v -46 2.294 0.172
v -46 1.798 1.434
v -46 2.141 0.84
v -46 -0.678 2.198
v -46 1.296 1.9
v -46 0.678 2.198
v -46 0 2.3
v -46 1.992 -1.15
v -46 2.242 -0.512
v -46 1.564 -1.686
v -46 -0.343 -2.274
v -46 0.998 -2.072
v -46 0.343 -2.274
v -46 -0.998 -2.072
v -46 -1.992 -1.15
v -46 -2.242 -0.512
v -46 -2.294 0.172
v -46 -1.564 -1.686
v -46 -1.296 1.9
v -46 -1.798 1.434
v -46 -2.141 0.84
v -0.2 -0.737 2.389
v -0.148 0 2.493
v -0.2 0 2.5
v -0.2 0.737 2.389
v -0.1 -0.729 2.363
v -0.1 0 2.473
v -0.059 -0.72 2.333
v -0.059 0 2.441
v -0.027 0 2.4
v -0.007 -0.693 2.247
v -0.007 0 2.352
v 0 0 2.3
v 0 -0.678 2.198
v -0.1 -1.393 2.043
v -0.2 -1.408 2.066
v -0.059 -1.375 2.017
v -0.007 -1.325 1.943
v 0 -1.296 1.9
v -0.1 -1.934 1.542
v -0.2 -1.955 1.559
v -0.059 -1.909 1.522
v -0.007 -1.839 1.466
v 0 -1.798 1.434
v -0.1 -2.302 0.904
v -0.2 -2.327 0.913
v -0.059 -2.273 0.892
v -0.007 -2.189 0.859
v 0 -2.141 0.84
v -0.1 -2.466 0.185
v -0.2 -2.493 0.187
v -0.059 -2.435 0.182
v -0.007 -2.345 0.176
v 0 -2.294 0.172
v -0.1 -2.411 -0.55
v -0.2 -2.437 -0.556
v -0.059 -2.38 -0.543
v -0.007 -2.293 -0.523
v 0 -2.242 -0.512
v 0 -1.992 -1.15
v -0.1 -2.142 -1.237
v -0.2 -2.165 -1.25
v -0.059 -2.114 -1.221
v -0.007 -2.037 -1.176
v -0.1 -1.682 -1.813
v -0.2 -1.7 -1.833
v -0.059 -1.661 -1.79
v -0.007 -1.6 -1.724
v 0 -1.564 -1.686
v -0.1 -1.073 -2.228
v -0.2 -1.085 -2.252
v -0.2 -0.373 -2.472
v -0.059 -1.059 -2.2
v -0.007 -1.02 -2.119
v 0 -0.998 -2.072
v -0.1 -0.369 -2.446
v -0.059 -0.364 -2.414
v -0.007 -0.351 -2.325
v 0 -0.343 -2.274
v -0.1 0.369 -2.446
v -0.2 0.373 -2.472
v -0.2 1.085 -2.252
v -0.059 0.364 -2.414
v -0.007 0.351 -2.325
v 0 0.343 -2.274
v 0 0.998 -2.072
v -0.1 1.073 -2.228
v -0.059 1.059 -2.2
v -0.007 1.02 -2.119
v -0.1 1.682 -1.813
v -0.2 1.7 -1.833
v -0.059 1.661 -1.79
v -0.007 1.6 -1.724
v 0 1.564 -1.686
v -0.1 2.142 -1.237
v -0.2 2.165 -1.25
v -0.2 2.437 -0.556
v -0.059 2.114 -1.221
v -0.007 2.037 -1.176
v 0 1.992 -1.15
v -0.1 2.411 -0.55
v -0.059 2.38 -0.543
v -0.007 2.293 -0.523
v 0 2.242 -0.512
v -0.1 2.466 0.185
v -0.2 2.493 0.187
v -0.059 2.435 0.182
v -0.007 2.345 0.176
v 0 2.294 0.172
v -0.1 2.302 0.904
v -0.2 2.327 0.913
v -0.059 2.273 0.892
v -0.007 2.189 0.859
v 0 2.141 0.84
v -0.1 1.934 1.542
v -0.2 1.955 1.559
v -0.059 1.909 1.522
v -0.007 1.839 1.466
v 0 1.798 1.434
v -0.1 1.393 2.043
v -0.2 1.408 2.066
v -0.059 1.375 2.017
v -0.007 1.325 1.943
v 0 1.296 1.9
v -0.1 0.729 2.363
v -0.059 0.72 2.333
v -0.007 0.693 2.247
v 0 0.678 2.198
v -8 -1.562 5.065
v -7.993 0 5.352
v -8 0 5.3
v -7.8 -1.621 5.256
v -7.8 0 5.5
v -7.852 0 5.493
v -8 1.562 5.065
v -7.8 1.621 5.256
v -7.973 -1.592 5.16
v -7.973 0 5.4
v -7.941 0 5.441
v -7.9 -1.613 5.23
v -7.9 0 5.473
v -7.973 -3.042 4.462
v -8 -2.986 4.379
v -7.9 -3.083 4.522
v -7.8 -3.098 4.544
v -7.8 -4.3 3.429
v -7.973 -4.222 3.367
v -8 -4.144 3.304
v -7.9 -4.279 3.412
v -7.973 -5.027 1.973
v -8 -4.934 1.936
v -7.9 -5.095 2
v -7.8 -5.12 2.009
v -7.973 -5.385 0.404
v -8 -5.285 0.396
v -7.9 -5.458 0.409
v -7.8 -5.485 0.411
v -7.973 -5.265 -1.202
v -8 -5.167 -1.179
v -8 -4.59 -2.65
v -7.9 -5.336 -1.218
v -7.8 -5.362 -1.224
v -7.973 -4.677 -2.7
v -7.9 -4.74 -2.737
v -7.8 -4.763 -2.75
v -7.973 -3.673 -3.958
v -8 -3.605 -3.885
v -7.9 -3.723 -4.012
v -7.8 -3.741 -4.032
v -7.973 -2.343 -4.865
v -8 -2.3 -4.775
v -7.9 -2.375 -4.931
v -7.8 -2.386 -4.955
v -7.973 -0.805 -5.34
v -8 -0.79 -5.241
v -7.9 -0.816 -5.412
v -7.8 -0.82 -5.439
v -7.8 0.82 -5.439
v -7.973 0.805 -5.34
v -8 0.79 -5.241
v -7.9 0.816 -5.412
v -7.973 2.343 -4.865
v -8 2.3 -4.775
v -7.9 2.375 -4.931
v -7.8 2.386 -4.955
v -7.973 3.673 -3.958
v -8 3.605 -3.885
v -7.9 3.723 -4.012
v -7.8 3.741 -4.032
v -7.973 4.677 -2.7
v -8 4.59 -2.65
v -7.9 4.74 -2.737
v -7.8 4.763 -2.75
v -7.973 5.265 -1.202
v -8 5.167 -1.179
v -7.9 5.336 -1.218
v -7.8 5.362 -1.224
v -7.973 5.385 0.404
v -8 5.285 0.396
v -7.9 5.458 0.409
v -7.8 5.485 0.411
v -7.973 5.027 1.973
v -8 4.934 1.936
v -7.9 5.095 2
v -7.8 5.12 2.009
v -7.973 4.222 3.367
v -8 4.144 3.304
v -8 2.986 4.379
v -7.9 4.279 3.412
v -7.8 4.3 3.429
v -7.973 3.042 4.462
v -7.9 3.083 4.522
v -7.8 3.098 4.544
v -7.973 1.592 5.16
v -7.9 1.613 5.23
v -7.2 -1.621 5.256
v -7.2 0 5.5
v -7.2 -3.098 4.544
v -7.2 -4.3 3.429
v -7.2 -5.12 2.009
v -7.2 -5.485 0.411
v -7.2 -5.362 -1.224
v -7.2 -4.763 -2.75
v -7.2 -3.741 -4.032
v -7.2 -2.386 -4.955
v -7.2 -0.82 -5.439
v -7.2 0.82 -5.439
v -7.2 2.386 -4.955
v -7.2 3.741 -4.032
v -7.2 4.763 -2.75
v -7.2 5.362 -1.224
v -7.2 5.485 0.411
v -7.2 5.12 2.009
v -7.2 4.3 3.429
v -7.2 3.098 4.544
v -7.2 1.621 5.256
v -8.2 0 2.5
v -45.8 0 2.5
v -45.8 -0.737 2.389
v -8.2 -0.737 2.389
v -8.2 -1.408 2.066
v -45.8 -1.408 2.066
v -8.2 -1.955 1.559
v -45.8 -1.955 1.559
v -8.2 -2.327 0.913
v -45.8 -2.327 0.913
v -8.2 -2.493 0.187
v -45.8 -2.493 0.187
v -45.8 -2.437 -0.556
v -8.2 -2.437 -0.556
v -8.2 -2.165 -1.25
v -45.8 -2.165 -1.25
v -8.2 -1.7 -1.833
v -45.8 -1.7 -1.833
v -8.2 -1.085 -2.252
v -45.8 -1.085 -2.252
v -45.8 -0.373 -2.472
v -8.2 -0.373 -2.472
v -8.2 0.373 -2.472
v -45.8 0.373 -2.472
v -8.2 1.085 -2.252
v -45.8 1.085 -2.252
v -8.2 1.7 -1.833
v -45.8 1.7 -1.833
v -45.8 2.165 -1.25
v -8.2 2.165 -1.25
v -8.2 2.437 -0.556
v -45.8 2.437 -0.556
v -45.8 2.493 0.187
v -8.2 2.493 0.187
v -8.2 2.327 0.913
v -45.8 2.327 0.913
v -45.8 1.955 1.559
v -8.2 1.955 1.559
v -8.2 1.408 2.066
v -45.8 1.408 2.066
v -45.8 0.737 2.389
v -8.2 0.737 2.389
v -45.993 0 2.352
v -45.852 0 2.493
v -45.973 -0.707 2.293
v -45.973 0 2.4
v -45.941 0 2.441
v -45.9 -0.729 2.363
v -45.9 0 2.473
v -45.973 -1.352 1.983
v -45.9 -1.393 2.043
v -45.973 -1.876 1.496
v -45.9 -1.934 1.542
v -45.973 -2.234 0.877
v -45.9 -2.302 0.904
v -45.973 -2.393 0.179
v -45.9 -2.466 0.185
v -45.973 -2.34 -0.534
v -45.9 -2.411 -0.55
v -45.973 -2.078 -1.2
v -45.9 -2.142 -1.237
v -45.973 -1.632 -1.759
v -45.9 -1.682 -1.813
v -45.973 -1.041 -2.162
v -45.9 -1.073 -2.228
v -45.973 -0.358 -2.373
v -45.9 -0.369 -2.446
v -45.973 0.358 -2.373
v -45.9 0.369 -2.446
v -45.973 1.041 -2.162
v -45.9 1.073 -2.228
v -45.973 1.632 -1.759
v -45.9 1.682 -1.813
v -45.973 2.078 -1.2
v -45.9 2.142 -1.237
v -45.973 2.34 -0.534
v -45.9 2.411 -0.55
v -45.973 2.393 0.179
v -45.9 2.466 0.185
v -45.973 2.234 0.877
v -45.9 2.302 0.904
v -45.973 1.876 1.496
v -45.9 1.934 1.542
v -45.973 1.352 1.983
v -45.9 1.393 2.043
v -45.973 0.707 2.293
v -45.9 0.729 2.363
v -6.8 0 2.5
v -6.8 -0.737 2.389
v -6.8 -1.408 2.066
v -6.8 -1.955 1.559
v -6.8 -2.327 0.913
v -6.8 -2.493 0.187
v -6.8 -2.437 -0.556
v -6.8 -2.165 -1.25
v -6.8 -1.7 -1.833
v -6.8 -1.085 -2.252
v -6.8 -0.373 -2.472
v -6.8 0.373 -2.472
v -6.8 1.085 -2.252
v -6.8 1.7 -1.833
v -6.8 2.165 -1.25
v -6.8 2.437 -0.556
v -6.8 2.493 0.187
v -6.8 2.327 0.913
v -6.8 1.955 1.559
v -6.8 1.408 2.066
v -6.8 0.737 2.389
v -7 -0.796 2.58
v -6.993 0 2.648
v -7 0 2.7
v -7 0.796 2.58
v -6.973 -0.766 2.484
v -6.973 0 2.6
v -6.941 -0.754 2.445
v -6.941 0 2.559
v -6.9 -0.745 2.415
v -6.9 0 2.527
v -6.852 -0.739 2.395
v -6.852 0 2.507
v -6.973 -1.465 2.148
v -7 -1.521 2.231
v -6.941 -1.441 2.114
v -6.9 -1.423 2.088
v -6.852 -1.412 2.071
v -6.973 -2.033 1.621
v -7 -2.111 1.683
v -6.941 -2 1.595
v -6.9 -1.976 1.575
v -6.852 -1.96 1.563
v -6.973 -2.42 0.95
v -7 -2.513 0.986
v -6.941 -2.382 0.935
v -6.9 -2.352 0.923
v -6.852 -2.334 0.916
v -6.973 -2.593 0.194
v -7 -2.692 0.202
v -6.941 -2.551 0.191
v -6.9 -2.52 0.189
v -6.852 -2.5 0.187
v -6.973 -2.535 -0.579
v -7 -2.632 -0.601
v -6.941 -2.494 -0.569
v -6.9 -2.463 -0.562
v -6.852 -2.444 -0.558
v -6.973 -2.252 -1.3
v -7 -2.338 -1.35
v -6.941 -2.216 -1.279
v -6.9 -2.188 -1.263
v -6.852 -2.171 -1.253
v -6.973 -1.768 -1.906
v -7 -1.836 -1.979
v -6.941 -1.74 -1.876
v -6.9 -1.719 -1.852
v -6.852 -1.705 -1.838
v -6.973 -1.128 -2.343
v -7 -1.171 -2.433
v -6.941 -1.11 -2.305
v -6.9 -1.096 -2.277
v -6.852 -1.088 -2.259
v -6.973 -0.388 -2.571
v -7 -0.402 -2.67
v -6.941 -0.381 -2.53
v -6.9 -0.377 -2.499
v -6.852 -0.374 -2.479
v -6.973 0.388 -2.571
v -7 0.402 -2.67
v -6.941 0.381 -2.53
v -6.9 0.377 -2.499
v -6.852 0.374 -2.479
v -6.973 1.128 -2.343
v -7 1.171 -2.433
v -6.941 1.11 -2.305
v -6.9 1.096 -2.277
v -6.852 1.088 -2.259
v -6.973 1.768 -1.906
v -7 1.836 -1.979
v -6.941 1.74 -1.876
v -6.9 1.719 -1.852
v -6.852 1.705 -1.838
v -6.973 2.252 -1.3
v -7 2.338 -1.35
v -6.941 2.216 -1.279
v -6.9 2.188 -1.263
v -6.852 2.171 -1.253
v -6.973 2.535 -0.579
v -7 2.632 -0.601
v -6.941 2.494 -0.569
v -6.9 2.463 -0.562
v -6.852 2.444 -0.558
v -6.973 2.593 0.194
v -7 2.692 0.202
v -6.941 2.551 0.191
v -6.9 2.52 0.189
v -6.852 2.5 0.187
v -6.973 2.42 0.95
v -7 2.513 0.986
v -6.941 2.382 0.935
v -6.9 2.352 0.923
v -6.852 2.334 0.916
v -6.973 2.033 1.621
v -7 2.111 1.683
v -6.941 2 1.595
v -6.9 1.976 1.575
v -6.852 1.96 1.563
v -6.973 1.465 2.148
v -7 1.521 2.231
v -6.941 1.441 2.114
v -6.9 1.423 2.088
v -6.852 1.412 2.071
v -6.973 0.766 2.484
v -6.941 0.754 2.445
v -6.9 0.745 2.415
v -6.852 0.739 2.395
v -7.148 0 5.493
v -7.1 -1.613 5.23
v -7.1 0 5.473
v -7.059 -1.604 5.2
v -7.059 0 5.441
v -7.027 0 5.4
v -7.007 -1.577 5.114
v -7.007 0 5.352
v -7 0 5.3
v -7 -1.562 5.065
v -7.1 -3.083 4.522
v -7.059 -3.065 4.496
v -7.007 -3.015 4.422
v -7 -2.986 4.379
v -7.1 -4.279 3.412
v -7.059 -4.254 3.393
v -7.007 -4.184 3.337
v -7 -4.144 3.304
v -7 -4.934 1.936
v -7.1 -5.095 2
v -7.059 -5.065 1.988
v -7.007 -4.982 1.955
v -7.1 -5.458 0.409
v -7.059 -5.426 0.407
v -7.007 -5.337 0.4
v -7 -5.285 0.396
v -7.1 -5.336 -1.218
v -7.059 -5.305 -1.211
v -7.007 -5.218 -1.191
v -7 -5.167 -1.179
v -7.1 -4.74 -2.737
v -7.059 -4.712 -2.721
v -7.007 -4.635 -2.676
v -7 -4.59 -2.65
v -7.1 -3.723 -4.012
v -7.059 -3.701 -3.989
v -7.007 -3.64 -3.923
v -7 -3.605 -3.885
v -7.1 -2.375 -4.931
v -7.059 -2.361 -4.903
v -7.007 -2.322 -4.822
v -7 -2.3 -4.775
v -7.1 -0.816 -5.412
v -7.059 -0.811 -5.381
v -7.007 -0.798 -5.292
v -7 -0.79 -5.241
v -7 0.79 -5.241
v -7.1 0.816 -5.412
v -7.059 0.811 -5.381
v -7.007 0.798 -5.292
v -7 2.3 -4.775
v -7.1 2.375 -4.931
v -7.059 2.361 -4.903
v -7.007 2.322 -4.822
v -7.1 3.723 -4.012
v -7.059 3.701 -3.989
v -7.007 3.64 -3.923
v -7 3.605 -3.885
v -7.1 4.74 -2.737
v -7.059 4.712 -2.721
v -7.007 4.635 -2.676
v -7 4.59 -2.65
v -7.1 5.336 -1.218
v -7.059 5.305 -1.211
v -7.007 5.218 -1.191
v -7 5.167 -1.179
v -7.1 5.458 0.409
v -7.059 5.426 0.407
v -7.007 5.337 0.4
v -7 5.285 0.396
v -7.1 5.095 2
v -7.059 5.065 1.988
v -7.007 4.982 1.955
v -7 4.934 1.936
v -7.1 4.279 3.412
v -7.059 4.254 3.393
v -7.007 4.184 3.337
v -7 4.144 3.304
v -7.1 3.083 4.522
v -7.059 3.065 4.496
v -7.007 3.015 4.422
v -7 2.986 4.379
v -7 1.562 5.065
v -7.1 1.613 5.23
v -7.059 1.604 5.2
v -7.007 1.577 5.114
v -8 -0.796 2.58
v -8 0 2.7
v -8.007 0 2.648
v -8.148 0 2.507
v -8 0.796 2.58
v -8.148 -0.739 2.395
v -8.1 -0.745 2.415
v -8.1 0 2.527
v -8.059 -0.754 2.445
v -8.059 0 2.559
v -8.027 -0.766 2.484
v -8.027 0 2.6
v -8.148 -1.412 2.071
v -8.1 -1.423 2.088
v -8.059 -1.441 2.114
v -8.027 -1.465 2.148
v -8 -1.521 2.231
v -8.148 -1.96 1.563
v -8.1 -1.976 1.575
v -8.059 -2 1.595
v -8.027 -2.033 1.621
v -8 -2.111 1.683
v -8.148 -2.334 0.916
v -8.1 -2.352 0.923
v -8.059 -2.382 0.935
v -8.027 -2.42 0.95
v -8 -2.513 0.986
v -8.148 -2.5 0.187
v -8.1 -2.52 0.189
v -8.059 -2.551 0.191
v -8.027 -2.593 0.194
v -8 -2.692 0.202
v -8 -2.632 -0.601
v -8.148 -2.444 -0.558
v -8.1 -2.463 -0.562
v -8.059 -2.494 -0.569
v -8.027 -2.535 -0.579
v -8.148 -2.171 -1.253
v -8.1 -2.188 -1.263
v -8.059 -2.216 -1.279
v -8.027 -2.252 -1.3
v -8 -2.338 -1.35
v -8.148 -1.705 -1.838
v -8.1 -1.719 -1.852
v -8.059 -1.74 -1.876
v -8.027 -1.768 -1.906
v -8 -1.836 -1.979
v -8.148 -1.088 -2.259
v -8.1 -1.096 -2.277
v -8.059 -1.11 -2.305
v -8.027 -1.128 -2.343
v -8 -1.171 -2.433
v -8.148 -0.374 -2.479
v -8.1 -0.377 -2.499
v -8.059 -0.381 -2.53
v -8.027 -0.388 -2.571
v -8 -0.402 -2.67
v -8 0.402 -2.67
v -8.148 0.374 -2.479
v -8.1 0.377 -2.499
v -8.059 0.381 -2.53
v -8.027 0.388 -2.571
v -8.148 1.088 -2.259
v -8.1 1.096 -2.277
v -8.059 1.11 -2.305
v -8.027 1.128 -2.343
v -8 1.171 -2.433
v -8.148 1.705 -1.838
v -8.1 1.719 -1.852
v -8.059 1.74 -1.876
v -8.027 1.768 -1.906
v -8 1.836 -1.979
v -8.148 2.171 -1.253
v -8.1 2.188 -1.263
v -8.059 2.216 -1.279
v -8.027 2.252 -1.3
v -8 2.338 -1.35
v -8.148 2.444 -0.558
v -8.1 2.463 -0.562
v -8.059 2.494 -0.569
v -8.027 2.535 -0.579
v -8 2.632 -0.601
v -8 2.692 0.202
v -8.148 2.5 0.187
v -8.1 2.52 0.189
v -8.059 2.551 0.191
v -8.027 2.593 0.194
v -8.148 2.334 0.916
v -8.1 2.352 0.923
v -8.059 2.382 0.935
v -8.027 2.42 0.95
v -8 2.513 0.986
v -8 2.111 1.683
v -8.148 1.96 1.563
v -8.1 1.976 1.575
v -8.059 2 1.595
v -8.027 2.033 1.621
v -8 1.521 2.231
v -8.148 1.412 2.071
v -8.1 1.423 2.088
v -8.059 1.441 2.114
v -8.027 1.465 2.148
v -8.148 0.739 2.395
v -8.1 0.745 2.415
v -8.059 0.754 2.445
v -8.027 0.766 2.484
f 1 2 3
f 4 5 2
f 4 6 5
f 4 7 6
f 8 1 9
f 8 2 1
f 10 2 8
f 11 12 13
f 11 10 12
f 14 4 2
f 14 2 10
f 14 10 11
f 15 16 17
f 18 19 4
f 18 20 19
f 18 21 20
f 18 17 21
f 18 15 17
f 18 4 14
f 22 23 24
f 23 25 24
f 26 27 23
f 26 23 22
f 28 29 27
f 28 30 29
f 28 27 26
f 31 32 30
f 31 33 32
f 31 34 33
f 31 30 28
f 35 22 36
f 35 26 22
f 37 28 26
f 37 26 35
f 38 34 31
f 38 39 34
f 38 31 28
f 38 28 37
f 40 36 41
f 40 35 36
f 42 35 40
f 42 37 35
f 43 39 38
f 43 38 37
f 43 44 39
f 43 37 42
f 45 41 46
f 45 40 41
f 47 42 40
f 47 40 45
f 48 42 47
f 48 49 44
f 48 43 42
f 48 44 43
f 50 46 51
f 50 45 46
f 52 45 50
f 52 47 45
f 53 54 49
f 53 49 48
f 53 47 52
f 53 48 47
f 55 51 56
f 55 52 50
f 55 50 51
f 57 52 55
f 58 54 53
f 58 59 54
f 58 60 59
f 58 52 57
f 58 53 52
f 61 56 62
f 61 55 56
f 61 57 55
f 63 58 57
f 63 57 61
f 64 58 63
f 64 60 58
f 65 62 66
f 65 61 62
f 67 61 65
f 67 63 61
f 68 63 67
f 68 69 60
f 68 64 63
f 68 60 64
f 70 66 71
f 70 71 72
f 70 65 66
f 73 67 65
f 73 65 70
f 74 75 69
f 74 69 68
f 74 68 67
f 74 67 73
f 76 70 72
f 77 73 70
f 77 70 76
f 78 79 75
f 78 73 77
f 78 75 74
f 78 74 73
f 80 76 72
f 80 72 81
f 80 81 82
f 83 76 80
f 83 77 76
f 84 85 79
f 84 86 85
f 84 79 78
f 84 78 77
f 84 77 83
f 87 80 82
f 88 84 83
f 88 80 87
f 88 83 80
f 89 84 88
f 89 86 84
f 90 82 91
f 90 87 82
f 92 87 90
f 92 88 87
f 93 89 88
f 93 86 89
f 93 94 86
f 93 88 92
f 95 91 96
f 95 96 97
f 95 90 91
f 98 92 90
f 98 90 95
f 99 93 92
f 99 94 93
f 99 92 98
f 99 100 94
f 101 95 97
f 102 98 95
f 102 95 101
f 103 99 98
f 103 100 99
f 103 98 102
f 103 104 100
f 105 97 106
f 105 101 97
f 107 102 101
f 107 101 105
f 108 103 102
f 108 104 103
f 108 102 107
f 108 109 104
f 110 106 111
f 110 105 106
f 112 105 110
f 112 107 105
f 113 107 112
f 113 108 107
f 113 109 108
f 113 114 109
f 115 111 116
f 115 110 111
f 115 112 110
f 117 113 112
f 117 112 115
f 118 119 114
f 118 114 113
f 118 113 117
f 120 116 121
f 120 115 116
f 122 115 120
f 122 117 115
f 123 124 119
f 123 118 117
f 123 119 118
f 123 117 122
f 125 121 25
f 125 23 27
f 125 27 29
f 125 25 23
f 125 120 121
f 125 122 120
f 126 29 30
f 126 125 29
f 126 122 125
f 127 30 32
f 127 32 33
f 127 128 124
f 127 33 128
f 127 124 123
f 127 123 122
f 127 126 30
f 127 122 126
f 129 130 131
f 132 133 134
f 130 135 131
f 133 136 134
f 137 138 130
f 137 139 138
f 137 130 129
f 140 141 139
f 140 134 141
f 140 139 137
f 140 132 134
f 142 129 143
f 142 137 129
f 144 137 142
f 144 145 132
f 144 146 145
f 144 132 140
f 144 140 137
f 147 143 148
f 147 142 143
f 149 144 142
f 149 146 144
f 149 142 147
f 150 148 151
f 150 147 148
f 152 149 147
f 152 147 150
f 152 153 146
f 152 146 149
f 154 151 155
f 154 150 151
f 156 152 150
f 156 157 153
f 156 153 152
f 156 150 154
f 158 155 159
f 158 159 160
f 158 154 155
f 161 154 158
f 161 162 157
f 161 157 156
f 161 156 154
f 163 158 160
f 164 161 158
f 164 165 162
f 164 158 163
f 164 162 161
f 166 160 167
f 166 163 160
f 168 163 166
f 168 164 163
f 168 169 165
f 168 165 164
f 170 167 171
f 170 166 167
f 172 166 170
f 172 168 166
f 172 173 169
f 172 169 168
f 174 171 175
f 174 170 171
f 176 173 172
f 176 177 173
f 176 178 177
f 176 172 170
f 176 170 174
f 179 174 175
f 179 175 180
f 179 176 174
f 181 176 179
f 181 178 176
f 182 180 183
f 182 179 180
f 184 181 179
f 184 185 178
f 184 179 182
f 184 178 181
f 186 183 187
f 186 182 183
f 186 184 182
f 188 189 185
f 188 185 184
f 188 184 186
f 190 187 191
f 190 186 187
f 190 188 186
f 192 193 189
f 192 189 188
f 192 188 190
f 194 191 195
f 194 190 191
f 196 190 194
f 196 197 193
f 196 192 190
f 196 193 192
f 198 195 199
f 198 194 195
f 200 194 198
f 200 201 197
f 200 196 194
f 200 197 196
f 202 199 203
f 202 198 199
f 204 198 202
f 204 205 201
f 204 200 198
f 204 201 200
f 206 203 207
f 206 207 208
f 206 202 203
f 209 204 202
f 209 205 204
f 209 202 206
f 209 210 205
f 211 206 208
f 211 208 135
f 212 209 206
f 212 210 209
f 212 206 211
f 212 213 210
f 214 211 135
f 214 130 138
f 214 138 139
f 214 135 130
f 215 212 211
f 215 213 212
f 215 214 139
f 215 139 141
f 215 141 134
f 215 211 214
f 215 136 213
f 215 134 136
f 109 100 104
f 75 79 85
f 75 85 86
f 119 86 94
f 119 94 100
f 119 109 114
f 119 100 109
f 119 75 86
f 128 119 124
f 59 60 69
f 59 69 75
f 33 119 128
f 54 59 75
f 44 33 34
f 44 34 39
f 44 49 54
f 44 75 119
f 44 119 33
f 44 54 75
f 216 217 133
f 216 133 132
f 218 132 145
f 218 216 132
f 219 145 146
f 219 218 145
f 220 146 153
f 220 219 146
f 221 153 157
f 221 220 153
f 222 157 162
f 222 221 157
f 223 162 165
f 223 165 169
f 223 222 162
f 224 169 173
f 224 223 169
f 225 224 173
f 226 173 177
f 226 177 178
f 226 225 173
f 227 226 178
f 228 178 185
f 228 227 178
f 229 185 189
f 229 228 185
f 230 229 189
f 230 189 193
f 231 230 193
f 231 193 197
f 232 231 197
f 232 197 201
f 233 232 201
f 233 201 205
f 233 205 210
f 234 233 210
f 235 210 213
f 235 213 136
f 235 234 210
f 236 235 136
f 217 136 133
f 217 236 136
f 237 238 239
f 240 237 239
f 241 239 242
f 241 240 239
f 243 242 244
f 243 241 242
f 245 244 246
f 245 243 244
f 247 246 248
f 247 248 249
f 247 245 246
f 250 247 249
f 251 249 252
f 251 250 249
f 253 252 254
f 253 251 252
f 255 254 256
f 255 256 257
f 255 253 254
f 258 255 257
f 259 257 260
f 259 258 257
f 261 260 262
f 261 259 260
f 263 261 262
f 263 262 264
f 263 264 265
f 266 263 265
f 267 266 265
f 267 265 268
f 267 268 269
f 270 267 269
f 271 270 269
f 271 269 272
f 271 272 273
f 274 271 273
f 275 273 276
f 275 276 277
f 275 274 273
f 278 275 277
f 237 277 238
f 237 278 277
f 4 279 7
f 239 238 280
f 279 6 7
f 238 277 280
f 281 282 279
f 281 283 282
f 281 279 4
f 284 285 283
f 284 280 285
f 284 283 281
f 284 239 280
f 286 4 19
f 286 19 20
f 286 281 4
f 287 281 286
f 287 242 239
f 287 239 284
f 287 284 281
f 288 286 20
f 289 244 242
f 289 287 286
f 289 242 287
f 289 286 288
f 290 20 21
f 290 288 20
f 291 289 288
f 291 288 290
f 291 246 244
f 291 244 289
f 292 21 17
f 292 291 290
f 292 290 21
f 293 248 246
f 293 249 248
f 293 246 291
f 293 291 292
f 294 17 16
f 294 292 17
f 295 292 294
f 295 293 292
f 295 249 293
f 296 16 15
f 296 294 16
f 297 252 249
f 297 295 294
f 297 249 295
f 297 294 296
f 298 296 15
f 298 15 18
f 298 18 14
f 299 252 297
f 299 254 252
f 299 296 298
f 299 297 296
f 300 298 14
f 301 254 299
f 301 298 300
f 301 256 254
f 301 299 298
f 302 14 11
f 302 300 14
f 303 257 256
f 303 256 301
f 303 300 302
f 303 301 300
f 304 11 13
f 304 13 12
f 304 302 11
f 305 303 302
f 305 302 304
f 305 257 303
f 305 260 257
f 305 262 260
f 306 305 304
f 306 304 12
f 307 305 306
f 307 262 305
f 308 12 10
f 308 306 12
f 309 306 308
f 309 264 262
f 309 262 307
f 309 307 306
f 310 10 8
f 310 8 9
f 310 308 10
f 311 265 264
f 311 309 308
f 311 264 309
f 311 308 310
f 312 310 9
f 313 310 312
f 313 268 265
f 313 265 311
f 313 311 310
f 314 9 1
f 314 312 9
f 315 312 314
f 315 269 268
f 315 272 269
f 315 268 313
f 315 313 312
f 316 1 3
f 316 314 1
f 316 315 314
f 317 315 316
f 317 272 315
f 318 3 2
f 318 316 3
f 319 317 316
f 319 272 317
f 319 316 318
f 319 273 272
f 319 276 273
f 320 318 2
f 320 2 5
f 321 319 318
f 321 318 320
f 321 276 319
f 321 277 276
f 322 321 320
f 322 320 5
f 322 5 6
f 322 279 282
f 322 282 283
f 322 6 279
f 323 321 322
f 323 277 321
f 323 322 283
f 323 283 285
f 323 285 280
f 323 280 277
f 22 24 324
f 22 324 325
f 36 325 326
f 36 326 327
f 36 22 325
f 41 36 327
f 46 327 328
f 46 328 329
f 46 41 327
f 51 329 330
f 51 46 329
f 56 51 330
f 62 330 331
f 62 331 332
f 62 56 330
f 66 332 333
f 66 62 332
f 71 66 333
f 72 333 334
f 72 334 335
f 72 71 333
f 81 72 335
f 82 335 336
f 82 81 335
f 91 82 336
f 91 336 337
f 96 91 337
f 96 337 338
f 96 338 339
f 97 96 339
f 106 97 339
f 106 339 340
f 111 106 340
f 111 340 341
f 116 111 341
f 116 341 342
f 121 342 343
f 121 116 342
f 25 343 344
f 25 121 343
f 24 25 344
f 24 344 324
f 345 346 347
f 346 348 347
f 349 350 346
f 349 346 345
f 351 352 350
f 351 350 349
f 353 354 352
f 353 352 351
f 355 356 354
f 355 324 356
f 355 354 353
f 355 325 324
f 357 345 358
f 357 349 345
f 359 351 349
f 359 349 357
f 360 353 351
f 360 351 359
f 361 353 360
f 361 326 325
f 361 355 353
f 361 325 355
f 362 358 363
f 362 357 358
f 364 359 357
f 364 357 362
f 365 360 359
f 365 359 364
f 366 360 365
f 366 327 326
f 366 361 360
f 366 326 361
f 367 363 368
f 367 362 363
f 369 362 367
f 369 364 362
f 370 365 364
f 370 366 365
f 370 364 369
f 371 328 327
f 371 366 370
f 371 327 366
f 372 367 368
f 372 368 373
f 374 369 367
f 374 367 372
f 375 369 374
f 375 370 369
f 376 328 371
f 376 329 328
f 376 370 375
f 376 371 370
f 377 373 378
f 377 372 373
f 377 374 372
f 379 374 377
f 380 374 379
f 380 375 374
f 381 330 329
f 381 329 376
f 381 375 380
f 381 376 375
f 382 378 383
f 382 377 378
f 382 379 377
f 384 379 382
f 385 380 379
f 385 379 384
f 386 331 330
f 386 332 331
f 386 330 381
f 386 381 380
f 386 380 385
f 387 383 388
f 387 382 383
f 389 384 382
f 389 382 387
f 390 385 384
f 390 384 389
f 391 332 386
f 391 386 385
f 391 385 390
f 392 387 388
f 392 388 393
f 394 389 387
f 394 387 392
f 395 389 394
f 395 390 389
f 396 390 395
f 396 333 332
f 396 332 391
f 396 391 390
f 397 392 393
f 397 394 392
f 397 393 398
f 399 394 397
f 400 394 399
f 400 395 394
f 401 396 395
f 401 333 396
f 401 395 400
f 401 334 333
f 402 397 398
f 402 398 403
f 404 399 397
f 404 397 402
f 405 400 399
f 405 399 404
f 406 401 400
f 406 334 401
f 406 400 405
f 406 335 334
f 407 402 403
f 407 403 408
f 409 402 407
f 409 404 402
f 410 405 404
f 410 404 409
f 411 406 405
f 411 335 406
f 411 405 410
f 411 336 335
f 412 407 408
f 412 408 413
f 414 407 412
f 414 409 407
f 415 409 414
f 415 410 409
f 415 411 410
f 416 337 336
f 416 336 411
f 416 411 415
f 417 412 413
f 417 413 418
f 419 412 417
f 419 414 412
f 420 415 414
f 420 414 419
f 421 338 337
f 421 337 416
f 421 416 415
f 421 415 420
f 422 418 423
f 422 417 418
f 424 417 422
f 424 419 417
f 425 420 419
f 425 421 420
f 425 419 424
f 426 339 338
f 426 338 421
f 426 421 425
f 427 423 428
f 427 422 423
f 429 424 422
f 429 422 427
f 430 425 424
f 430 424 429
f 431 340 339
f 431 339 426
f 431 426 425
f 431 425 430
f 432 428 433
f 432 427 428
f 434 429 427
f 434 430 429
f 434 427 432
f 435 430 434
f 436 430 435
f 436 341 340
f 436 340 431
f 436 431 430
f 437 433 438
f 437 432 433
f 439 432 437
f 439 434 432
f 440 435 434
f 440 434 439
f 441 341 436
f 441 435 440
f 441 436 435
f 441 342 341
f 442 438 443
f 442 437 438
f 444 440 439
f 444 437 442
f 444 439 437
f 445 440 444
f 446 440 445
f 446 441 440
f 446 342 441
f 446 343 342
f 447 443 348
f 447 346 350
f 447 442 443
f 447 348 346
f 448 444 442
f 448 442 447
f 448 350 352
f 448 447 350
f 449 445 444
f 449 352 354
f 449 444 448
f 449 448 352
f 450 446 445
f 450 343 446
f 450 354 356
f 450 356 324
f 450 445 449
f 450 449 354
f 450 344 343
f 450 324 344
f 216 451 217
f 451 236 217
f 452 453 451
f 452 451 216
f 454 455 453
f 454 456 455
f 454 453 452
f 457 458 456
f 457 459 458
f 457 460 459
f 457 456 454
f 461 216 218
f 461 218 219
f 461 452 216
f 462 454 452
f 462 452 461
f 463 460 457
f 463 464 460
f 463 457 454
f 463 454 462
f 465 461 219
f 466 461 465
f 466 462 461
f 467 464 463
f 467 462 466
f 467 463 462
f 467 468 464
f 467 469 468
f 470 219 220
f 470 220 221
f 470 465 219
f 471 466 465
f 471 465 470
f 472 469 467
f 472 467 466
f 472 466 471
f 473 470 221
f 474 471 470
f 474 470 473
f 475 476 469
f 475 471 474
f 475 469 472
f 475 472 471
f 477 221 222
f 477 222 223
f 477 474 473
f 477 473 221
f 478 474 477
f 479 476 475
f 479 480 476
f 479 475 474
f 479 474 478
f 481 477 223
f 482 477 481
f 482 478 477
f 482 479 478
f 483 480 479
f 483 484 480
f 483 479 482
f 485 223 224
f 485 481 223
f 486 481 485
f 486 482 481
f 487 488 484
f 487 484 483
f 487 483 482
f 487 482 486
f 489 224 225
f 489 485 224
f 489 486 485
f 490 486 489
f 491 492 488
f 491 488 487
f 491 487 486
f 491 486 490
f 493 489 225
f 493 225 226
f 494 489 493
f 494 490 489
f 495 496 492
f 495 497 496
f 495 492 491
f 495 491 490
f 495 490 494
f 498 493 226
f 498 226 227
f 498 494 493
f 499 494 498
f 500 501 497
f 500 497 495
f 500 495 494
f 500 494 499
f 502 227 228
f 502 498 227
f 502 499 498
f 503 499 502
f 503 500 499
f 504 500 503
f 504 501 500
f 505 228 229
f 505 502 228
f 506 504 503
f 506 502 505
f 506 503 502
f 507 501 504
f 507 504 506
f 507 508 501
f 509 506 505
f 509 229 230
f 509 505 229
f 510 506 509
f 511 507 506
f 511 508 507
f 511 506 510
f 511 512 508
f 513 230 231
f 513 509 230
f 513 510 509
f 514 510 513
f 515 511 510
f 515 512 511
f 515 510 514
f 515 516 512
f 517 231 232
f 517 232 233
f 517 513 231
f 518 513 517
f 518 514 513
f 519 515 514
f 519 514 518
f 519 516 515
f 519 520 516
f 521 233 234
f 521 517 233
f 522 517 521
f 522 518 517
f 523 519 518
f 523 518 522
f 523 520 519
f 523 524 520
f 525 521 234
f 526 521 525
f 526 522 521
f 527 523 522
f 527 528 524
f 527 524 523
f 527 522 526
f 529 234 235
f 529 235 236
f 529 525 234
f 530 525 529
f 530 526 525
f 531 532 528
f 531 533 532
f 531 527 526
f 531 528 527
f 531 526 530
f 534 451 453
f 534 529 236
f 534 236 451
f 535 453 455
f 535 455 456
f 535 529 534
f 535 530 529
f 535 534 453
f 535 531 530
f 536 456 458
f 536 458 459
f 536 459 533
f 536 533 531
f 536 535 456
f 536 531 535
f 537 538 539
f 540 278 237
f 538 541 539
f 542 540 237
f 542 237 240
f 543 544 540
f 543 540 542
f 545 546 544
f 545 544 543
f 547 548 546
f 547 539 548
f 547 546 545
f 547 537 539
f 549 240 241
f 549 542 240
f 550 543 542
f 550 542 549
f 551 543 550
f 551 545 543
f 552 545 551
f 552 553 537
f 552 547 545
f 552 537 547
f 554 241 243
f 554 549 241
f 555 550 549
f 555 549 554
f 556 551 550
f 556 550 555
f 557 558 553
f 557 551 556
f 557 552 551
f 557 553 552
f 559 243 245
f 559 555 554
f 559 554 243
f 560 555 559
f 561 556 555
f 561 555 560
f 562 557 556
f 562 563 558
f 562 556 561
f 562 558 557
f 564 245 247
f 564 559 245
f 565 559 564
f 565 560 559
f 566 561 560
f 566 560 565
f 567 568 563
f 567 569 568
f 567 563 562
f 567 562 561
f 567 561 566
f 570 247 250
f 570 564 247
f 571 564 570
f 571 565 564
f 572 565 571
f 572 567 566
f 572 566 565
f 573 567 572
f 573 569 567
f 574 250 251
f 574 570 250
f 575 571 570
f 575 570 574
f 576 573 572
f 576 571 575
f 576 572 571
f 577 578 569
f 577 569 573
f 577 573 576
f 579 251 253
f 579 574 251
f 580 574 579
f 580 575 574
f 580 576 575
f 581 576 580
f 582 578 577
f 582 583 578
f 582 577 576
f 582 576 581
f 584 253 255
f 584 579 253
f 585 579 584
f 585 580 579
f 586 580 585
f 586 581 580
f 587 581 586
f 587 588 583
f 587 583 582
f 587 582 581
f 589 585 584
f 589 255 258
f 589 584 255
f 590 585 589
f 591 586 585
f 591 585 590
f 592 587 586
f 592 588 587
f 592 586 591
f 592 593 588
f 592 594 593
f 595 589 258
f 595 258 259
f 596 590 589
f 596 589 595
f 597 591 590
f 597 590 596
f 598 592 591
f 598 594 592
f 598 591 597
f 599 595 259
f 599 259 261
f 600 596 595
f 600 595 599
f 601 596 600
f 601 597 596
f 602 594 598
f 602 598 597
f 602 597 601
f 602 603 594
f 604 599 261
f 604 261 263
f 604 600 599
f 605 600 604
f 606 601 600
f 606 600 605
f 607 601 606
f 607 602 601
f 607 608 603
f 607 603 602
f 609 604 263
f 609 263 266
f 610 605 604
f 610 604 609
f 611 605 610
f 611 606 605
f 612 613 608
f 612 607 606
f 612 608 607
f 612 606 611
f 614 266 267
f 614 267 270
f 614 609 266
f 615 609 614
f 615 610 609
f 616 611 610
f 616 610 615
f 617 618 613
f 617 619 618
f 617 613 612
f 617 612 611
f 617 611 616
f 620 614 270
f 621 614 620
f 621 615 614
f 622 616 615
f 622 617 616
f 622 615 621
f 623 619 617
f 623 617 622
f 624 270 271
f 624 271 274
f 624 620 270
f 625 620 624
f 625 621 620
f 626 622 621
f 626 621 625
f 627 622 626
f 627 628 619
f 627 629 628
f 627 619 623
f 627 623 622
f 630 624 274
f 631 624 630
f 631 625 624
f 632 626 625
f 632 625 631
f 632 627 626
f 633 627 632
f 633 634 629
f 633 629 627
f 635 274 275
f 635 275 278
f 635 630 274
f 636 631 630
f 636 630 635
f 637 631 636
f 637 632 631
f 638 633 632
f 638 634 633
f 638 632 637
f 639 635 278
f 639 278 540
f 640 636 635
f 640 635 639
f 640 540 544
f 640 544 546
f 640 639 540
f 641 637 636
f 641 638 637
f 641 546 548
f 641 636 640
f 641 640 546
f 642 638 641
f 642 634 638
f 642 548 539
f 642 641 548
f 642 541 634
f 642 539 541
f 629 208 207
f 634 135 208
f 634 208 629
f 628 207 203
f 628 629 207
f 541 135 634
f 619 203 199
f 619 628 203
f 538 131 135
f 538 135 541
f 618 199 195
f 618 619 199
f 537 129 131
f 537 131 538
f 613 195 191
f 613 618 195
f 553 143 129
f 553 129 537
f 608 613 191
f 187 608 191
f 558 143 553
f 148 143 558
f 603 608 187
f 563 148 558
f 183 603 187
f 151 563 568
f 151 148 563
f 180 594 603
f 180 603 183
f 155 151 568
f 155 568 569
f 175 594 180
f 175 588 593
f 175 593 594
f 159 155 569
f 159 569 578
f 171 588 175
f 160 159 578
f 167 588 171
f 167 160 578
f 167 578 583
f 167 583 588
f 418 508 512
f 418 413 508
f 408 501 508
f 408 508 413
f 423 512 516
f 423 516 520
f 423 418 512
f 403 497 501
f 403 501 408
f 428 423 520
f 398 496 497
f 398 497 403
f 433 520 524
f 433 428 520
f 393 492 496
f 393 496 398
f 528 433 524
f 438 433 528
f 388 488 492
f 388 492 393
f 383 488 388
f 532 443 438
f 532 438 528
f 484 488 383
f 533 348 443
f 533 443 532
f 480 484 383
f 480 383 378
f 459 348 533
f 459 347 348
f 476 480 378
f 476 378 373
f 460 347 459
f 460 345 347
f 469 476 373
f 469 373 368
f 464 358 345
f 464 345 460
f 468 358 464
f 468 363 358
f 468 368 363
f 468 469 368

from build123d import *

# Parameters (mm, degrees)
CONG_1_R = 0.2


with BuildPart() as part:
    # Esquisse1 → Révolution1 (revolve)
    with BuildSketch(Plane.XY, mode=Mode.PRIVATE) as r_volution1_sk:
        Polygon((-46, 0), (-46, 2.5), (-8, 2.5), (-8, 5.5), (-7, 5.5), (-7, 2.5), (0, 2.5), (0, 0), align=None)
    revolve(r_volution1_sk.sketch.rotate(Axis((-86.086708861, 0, 0), (1, 0, 0)), 90), axis=Axis((-86.086708861, 0, 0), (1, 0, 0)))

    # Congé1
    cong_1_edges = [part.edges().sort_by_distance(p)[0] for p in [
        (-46, 0, -2.5),
        (-8, 0, -2.5),
        (-8, 0, -5.5),
        (-7, 0, -5.5),
        (-7, 0, -2.5),
        (0, 0, -2.5),
    ]]
    fillet(cong_1_edges, radius=CONG_1_R)


solid = part.part
